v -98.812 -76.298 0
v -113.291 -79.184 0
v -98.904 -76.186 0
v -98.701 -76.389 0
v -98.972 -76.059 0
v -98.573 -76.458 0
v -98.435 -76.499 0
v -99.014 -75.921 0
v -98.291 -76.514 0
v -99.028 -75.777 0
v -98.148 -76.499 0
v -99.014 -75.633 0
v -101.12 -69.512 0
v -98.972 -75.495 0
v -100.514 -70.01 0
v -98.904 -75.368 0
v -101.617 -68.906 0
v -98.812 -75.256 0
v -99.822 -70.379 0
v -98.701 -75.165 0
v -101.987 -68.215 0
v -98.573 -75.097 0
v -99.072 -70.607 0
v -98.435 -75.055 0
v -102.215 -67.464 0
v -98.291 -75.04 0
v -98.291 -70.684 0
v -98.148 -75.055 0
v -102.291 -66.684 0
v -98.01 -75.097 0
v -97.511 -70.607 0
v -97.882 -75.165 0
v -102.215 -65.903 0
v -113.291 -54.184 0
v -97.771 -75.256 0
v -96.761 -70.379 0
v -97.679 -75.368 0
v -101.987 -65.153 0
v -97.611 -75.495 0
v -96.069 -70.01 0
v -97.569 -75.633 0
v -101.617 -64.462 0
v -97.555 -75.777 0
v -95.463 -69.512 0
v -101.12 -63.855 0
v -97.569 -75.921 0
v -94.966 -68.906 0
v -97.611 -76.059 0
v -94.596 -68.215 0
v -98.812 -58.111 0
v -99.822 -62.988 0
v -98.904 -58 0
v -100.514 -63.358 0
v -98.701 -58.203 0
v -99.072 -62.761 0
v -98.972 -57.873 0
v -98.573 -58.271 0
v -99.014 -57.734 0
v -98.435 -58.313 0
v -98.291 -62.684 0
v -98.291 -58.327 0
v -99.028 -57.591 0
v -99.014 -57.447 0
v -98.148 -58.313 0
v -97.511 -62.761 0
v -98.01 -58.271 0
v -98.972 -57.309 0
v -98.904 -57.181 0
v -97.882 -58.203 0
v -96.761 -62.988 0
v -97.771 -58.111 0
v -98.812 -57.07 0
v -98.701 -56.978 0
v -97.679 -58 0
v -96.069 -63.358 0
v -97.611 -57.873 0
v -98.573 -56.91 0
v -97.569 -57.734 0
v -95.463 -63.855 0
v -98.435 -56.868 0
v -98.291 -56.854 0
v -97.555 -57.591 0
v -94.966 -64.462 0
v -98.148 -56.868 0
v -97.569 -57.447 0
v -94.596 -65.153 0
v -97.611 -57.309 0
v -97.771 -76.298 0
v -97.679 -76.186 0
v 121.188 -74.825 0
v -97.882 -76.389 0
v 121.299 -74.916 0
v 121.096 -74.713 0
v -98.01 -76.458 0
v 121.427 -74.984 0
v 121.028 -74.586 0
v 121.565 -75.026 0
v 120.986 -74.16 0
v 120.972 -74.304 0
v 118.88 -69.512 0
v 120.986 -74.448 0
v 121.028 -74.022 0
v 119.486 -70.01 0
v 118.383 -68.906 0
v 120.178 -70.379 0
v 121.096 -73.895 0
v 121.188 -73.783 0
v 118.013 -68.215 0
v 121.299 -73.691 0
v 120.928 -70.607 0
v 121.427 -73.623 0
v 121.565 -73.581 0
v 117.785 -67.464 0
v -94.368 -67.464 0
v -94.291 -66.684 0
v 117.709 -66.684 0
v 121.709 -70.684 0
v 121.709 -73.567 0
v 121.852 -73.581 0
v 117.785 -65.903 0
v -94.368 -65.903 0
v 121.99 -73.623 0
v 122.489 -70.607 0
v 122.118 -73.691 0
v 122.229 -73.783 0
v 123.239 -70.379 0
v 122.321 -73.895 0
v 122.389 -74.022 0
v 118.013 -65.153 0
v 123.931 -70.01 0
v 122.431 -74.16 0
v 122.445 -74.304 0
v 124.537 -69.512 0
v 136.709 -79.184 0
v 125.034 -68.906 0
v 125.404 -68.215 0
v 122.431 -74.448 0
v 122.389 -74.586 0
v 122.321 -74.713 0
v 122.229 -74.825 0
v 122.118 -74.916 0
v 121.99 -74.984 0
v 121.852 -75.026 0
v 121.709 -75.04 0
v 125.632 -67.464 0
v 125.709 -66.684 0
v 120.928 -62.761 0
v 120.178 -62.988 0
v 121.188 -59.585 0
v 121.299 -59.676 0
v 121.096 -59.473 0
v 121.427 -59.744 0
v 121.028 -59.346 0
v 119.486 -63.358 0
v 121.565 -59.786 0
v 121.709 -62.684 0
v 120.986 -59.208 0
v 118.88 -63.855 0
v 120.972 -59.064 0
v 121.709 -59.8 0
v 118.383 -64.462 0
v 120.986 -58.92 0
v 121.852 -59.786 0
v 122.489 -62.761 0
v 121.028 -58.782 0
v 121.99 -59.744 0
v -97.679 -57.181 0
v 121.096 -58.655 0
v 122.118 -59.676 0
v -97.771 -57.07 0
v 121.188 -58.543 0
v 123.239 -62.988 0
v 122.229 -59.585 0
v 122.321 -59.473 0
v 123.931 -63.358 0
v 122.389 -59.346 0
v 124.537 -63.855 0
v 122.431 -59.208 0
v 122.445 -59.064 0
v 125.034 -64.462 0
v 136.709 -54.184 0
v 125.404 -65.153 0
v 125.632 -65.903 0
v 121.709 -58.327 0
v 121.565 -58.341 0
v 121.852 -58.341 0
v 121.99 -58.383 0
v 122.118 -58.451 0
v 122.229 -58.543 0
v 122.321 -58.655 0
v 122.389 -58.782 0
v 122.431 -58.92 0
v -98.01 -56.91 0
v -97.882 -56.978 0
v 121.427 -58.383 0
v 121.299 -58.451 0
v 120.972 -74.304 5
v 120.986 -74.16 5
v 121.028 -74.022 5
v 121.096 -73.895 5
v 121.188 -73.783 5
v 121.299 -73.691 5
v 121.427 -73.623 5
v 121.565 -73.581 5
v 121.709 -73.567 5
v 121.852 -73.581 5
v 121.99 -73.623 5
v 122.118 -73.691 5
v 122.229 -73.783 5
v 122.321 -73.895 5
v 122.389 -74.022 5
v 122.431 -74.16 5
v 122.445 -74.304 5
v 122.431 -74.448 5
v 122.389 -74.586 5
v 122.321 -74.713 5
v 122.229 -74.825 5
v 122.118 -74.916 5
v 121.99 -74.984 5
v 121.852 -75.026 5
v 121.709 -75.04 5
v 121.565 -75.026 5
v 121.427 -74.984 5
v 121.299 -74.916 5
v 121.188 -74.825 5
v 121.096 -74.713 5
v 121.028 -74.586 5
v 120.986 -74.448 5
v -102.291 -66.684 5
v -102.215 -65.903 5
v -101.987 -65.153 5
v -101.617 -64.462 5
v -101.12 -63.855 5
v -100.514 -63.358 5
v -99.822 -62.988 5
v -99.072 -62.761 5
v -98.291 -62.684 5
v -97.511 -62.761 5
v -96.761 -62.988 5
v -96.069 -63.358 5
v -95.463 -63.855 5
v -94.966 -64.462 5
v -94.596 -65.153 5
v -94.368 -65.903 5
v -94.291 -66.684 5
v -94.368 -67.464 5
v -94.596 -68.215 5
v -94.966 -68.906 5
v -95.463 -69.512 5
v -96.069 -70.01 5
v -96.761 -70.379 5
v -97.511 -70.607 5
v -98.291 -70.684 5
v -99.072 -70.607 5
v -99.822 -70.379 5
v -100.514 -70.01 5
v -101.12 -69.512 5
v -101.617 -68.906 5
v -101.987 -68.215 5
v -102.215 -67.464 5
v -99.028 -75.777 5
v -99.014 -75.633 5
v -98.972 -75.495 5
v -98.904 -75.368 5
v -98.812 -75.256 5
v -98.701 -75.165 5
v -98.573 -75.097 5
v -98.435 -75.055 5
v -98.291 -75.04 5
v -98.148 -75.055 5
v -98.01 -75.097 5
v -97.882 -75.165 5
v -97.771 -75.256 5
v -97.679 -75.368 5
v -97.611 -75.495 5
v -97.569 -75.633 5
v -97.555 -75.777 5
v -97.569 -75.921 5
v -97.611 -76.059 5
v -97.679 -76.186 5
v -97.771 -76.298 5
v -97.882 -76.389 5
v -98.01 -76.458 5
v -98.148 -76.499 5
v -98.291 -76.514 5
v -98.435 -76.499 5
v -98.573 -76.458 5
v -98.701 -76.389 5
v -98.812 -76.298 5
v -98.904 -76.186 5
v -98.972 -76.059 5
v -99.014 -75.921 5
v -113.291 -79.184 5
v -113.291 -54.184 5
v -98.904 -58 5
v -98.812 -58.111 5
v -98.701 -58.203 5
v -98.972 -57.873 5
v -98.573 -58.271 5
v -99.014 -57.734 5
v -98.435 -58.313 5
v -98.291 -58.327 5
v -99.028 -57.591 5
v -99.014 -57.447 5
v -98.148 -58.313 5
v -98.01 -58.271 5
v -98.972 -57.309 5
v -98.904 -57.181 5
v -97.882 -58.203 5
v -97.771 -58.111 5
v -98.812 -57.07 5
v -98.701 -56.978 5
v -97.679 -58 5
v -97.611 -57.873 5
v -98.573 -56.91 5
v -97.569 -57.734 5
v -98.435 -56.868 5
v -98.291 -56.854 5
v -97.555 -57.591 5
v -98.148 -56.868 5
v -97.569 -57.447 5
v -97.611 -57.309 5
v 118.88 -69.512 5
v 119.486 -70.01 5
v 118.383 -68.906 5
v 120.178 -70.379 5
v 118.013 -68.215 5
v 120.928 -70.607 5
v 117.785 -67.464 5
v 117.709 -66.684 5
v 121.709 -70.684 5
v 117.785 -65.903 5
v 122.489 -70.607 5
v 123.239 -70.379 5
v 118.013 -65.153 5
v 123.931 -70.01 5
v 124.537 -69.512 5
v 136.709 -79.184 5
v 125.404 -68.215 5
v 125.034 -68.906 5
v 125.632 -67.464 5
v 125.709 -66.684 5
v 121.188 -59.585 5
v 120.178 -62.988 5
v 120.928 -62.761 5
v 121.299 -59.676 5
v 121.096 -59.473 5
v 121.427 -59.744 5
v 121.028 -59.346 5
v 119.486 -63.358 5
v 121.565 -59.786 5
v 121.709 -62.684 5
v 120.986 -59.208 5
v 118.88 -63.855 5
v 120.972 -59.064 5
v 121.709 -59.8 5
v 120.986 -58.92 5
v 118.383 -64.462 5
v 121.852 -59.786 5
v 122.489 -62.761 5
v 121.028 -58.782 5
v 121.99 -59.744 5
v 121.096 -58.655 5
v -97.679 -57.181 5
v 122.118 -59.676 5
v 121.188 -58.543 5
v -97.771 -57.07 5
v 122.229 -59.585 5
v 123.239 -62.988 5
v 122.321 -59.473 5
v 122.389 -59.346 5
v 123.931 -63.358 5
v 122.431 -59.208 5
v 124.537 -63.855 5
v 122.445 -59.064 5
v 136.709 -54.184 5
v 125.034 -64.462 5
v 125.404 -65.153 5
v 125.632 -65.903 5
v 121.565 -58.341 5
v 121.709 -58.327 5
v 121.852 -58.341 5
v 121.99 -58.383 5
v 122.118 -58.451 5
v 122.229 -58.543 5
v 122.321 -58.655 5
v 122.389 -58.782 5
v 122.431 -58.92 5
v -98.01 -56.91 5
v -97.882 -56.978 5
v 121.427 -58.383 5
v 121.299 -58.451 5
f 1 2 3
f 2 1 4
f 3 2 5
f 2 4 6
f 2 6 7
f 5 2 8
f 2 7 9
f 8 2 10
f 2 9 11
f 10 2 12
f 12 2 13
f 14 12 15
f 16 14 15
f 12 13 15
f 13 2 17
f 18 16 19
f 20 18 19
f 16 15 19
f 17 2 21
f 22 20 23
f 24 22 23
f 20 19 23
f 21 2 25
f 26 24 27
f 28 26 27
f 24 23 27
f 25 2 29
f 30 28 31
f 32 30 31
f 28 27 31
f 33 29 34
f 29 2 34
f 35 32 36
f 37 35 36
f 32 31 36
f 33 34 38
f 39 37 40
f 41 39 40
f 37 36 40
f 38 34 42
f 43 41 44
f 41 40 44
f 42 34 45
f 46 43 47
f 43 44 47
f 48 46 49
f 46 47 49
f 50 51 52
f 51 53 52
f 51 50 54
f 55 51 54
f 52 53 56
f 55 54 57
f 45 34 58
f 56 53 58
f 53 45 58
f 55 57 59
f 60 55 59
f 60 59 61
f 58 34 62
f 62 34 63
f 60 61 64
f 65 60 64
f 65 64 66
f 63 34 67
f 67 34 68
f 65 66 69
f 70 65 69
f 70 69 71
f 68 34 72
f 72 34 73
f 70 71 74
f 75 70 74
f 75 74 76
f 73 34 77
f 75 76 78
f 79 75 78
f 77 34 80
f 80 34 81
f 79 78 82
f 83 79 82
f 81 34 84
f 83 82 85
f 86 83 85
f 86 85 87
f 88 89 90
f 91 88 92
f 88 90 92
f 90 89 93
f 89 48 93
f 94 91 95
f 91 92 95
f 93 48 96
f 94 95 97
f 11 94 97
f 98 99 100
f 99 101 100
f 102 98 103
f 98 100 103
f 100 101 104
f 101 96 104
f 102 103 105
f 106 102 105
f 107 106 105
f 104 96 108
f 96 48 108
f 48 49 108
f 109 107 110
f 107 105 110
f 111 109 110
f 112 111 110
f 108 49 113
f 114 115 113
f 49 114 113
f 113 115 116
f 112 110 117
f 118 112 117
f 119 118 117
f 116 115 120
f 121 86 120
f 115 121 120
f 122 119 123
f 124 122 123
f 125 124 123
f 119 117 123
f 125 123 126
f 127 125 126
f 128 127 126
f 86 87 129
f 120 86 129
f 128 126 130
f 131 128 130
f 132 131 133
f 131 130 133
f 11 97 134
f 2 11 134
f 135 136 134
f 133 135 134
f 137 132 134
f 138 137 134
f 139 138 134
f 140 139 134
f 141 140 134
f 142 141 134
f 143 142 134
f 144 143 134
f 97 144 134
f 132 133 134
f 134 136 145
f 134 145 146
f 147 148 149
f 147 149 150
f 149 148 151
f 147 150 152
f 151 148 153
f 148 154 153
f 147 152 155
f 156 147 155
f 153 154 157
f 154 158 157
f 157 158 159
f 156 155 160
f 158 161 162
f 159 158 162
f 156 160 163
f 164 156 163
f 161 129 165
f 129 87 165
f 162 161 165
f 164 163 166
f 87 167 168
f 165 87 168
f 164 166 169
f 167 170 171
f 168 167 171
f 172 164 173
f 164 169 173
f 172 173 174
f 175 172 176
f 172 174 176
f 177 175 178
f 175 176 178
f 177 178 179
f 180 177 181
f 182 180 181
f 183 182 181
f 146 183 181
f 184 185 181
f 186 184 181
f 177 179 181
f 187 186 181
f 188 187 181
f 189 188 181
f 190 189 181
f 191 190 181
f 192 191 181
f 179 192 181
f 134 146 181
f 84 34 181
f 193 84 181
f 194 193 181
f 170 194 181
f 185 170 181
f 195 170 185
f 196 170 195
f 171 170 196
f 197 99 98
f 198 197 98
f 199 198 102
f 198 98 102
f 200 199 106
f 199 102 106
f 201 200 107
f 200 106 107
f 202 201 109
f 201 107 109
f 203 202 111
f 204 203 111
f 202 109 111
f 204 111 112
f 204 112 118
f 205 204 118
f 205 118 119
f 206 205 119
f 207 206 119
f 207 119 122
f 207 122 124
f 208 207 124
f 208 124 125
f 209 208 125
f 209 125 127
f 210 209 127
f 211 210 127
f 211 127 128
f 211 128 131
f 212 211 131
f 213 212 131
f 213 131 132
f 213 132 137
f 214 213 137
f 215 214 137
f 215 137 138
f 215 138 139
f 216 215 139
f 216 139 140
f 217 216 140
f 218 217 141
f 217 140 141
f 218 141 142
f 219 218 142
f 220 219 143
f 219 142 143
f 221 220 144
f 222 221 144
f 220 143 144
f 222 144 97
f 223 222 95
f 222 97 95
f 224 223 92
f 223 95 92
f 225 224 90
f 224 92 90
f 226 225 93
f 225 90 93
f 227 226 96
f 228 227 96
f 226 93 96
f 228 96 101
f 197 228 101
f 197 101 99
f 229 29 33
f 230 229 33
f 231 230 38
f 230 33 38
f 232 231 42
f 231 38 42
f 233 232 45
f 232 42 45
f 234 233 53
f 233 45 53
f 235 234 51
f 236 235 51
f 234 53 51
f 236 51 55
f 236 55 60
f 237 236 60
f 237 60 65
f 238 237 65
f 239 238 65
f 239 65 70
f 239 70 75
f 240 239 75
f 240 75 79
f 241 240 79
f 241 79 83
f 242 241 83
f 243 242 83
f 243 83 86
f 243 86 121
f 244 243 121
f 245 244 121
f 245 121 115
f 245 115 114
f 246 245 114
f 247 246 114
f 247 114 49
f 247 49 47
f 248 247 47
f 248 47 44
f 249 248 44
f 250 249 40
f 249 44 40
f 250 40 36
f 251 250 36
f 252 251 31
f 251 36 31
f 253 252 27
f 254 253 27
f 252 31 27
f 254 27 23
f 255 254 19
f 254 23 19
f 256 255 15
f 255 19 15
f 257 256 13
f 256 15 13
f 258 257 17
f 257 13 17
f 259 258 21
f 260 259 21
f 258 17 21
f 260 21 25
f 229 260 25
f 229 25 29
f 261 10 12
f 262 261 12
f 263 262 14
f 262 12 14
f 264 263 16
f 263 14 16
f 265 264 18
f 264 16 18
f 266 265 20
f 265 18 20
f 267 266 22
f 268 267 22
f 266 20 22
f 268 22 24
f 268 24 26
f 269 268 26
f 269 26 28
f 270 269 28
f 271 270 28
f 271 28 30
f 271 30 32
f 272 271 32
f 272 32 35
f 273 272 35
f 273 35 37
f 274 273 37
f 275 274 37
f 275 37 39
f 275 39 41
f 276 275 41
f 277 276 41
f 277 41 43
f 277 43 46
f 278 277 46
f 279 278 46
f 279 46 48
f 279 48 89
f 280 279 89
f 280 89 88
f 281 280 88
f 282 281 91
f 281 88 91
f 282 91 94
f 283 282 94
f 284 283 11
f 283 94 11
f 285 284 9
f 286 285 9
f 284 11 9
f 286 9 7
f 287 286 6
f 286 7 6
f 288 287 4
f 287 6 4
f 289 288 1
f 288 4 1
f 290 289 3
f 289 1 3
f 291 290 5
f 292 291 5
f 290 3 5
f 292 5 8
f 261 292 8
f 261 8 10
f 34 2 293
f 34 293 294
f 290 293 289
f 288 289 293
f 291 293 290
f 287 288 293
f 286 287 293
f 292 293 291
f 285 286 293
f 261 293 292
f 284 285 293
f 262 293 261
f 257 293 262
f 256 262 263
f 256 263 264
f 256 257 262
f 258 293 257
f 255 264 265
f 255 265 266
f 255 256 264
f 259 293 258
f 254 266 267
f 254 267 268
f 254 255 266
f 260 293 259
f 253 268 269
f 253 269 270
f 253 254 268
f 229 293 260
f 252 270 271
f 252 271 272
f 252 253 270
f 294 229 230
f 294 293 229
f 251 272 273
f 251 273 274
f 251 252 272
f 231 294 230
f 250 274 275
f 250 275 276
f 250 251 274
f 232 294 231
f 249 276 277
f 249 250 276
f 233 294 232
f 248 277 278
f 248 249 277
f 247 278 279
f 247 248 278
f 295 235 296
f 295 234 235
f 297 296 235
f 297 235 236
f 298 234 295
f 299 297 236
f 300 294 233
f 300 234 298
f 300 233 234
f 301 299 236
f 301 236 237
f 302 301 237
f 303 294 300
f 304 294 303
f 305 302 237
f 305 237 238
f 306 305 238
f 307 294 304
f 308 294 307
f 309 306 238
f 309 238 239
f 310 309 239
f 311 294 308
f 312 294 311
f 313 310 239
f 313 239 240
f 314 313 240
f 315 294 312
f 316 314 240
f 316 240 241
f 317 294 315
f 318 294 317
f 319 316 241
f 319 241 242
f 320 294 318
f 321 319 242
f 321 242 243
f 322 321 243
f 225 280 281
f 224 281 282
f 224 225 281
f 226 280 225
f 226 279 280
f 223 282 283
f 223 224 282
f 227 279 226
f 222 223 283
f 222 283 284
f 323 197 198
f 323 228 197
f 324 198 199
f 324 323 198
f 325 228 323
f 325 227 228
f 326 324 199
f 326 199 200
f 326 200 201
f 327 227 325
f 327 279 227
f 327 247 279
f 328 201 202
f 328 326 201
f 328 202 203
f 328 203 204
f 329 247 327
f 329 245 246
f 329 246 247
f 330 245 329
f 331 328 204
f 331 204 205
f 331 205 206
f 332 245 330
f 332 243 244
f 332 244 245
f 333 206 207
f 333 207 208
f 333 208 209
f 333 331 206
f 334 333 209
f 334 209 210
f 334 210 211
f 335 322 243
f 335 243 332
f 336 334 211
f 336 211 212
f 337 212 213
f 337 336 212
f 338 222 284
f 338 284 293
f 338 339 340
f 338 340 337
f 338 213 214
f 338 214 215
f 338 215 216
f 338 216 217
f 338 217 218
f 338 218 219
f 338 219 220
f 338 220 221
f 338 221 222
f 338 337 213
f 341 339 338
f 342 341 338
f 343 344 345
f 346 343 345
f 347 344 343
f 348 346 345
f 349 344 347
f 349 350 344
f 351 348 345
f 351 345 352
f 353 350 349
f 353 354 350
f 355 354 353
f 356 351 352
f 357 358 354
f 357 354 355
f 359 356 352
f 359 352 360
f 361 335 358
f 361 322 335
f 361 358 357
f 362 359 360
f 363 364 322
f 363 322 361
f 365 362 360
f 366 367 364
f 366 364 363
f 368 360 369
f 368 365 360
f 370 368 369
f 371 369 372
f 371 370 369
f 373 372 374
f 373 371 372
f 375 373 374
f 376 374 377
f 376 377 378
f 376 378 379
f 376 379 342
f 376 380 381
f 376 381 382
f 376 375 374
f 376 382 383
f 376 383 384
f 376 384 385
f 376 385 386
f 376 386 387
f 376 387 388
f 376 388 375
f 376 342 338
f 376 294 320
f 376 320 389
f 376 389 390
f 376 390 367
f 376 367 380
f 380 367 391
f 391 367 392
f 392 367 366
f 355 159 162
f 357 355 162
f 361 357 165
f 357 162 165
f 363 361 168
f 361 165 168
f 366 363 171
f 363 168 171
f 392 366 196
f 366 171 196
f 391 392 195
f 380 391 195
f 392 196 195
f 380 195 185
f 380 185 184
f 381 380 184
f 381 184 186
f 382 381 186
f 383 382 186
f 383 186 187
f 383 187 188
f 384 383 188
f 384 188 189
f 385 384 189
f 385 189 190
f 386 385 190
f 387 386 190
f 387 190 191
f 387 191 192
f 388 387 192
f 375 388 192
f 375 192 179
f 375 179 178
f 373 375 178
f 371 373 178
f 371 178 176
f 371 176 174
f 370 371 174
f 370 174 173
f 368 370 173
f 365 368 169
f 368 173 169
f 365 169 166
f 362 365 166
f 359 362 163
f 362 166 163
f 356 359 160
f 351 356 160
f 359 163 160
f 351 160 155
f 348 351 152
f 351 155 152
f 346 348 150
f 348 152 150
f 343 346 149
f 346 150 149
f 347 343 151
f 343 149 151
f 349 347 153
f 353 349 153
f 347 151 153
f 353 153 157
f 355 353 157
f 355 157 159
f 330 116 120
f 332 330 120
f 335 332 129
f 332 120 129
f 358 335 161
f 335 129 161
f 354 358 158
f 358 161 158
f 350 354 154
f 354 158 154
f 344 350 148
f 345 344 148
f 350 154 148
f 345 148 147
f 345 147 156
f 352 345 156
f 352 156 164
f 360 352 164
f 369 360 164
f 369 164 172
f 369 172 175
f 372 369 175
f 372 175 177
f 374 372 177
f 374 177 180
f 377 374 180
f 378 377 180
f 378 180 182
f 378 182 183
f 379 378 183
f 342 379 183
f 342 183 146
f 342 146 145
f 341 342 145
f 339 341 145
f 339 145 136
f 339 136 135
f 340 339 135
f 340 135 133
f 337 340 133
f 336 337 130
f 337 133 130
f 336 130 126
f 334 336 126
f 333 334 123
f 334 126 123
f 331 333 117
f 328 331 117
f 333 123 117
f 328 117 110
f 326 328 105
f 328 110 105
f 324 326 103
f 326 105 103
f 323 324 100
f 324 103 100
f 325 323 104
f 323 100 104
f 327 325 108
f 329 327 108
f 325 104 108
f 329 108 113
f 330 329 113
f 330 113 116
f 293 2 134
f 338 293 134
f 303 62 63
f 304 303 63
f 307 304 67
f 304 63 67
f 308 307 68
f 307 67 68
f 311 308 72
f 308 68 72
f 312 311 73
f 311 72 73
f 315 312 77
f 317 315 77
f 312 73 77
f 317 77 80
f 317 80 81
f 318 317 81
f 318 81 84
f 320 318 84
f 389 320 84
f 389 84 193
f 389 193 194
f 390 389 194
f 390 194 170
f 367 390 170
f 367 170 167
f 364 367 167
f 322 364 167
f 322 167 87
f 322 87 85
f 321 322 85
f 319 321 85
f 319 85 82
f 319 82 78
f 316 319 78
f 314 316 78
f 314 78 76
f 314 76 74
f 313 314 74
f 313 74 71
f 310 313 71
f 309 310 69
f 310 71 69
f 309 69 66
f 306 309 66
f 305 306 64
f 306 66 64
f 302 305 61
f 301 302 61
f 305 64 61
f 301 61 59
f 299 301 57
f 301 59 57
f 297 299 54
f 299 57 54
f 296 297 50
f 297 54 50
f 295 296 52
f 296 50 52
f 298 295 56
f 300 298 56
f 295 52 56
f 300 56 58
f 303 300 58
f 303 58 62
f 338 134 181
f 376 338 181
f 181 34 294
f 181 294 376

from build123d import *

# Parameters (mm, degrees)
F0_W     = 250
F0_H     = 25
F1_DEPTH = 5
F3_D     = 1.4732
F4_D     = 1.4732
F5_D     = 1.4732
F6_D     = 8


with BuildPart() as f1:
    # F0 (on Top) → F1 (new body)
    with BuildSketch(Plane.XY):
        with Locations((11.708578, -66.683836)):
            Rectangle(F0_W, F0_H)
    extrude(amount=F1_DEPTH)

    # F3 (through all)
    with Locations(Plane.XY.offset(5)):
        with Locations((-98.291422, -57.590636)):
            Hole(F3_D / 2)

    # F4 (through all)
    with Locations(Plane.XY.offset(5)):
        with Locations((-98.291422, -75.777036)):
            Hole(F4_D / 2)

    # F5 (through all)
    with Locations(Plane.XY.offset(5)):
        with Locations((121.708578, -59.063836), (121.708578, -74.303836)):
            Hole(F5_D / 2)

    # F6 (through all)
    with Locations(Plane.XY.offset(5)):
        with Locations((-98.291422, -66.683836), (121.708578, -66.683836)):
            Hole(F6_D / 2)


solid = f1.part
